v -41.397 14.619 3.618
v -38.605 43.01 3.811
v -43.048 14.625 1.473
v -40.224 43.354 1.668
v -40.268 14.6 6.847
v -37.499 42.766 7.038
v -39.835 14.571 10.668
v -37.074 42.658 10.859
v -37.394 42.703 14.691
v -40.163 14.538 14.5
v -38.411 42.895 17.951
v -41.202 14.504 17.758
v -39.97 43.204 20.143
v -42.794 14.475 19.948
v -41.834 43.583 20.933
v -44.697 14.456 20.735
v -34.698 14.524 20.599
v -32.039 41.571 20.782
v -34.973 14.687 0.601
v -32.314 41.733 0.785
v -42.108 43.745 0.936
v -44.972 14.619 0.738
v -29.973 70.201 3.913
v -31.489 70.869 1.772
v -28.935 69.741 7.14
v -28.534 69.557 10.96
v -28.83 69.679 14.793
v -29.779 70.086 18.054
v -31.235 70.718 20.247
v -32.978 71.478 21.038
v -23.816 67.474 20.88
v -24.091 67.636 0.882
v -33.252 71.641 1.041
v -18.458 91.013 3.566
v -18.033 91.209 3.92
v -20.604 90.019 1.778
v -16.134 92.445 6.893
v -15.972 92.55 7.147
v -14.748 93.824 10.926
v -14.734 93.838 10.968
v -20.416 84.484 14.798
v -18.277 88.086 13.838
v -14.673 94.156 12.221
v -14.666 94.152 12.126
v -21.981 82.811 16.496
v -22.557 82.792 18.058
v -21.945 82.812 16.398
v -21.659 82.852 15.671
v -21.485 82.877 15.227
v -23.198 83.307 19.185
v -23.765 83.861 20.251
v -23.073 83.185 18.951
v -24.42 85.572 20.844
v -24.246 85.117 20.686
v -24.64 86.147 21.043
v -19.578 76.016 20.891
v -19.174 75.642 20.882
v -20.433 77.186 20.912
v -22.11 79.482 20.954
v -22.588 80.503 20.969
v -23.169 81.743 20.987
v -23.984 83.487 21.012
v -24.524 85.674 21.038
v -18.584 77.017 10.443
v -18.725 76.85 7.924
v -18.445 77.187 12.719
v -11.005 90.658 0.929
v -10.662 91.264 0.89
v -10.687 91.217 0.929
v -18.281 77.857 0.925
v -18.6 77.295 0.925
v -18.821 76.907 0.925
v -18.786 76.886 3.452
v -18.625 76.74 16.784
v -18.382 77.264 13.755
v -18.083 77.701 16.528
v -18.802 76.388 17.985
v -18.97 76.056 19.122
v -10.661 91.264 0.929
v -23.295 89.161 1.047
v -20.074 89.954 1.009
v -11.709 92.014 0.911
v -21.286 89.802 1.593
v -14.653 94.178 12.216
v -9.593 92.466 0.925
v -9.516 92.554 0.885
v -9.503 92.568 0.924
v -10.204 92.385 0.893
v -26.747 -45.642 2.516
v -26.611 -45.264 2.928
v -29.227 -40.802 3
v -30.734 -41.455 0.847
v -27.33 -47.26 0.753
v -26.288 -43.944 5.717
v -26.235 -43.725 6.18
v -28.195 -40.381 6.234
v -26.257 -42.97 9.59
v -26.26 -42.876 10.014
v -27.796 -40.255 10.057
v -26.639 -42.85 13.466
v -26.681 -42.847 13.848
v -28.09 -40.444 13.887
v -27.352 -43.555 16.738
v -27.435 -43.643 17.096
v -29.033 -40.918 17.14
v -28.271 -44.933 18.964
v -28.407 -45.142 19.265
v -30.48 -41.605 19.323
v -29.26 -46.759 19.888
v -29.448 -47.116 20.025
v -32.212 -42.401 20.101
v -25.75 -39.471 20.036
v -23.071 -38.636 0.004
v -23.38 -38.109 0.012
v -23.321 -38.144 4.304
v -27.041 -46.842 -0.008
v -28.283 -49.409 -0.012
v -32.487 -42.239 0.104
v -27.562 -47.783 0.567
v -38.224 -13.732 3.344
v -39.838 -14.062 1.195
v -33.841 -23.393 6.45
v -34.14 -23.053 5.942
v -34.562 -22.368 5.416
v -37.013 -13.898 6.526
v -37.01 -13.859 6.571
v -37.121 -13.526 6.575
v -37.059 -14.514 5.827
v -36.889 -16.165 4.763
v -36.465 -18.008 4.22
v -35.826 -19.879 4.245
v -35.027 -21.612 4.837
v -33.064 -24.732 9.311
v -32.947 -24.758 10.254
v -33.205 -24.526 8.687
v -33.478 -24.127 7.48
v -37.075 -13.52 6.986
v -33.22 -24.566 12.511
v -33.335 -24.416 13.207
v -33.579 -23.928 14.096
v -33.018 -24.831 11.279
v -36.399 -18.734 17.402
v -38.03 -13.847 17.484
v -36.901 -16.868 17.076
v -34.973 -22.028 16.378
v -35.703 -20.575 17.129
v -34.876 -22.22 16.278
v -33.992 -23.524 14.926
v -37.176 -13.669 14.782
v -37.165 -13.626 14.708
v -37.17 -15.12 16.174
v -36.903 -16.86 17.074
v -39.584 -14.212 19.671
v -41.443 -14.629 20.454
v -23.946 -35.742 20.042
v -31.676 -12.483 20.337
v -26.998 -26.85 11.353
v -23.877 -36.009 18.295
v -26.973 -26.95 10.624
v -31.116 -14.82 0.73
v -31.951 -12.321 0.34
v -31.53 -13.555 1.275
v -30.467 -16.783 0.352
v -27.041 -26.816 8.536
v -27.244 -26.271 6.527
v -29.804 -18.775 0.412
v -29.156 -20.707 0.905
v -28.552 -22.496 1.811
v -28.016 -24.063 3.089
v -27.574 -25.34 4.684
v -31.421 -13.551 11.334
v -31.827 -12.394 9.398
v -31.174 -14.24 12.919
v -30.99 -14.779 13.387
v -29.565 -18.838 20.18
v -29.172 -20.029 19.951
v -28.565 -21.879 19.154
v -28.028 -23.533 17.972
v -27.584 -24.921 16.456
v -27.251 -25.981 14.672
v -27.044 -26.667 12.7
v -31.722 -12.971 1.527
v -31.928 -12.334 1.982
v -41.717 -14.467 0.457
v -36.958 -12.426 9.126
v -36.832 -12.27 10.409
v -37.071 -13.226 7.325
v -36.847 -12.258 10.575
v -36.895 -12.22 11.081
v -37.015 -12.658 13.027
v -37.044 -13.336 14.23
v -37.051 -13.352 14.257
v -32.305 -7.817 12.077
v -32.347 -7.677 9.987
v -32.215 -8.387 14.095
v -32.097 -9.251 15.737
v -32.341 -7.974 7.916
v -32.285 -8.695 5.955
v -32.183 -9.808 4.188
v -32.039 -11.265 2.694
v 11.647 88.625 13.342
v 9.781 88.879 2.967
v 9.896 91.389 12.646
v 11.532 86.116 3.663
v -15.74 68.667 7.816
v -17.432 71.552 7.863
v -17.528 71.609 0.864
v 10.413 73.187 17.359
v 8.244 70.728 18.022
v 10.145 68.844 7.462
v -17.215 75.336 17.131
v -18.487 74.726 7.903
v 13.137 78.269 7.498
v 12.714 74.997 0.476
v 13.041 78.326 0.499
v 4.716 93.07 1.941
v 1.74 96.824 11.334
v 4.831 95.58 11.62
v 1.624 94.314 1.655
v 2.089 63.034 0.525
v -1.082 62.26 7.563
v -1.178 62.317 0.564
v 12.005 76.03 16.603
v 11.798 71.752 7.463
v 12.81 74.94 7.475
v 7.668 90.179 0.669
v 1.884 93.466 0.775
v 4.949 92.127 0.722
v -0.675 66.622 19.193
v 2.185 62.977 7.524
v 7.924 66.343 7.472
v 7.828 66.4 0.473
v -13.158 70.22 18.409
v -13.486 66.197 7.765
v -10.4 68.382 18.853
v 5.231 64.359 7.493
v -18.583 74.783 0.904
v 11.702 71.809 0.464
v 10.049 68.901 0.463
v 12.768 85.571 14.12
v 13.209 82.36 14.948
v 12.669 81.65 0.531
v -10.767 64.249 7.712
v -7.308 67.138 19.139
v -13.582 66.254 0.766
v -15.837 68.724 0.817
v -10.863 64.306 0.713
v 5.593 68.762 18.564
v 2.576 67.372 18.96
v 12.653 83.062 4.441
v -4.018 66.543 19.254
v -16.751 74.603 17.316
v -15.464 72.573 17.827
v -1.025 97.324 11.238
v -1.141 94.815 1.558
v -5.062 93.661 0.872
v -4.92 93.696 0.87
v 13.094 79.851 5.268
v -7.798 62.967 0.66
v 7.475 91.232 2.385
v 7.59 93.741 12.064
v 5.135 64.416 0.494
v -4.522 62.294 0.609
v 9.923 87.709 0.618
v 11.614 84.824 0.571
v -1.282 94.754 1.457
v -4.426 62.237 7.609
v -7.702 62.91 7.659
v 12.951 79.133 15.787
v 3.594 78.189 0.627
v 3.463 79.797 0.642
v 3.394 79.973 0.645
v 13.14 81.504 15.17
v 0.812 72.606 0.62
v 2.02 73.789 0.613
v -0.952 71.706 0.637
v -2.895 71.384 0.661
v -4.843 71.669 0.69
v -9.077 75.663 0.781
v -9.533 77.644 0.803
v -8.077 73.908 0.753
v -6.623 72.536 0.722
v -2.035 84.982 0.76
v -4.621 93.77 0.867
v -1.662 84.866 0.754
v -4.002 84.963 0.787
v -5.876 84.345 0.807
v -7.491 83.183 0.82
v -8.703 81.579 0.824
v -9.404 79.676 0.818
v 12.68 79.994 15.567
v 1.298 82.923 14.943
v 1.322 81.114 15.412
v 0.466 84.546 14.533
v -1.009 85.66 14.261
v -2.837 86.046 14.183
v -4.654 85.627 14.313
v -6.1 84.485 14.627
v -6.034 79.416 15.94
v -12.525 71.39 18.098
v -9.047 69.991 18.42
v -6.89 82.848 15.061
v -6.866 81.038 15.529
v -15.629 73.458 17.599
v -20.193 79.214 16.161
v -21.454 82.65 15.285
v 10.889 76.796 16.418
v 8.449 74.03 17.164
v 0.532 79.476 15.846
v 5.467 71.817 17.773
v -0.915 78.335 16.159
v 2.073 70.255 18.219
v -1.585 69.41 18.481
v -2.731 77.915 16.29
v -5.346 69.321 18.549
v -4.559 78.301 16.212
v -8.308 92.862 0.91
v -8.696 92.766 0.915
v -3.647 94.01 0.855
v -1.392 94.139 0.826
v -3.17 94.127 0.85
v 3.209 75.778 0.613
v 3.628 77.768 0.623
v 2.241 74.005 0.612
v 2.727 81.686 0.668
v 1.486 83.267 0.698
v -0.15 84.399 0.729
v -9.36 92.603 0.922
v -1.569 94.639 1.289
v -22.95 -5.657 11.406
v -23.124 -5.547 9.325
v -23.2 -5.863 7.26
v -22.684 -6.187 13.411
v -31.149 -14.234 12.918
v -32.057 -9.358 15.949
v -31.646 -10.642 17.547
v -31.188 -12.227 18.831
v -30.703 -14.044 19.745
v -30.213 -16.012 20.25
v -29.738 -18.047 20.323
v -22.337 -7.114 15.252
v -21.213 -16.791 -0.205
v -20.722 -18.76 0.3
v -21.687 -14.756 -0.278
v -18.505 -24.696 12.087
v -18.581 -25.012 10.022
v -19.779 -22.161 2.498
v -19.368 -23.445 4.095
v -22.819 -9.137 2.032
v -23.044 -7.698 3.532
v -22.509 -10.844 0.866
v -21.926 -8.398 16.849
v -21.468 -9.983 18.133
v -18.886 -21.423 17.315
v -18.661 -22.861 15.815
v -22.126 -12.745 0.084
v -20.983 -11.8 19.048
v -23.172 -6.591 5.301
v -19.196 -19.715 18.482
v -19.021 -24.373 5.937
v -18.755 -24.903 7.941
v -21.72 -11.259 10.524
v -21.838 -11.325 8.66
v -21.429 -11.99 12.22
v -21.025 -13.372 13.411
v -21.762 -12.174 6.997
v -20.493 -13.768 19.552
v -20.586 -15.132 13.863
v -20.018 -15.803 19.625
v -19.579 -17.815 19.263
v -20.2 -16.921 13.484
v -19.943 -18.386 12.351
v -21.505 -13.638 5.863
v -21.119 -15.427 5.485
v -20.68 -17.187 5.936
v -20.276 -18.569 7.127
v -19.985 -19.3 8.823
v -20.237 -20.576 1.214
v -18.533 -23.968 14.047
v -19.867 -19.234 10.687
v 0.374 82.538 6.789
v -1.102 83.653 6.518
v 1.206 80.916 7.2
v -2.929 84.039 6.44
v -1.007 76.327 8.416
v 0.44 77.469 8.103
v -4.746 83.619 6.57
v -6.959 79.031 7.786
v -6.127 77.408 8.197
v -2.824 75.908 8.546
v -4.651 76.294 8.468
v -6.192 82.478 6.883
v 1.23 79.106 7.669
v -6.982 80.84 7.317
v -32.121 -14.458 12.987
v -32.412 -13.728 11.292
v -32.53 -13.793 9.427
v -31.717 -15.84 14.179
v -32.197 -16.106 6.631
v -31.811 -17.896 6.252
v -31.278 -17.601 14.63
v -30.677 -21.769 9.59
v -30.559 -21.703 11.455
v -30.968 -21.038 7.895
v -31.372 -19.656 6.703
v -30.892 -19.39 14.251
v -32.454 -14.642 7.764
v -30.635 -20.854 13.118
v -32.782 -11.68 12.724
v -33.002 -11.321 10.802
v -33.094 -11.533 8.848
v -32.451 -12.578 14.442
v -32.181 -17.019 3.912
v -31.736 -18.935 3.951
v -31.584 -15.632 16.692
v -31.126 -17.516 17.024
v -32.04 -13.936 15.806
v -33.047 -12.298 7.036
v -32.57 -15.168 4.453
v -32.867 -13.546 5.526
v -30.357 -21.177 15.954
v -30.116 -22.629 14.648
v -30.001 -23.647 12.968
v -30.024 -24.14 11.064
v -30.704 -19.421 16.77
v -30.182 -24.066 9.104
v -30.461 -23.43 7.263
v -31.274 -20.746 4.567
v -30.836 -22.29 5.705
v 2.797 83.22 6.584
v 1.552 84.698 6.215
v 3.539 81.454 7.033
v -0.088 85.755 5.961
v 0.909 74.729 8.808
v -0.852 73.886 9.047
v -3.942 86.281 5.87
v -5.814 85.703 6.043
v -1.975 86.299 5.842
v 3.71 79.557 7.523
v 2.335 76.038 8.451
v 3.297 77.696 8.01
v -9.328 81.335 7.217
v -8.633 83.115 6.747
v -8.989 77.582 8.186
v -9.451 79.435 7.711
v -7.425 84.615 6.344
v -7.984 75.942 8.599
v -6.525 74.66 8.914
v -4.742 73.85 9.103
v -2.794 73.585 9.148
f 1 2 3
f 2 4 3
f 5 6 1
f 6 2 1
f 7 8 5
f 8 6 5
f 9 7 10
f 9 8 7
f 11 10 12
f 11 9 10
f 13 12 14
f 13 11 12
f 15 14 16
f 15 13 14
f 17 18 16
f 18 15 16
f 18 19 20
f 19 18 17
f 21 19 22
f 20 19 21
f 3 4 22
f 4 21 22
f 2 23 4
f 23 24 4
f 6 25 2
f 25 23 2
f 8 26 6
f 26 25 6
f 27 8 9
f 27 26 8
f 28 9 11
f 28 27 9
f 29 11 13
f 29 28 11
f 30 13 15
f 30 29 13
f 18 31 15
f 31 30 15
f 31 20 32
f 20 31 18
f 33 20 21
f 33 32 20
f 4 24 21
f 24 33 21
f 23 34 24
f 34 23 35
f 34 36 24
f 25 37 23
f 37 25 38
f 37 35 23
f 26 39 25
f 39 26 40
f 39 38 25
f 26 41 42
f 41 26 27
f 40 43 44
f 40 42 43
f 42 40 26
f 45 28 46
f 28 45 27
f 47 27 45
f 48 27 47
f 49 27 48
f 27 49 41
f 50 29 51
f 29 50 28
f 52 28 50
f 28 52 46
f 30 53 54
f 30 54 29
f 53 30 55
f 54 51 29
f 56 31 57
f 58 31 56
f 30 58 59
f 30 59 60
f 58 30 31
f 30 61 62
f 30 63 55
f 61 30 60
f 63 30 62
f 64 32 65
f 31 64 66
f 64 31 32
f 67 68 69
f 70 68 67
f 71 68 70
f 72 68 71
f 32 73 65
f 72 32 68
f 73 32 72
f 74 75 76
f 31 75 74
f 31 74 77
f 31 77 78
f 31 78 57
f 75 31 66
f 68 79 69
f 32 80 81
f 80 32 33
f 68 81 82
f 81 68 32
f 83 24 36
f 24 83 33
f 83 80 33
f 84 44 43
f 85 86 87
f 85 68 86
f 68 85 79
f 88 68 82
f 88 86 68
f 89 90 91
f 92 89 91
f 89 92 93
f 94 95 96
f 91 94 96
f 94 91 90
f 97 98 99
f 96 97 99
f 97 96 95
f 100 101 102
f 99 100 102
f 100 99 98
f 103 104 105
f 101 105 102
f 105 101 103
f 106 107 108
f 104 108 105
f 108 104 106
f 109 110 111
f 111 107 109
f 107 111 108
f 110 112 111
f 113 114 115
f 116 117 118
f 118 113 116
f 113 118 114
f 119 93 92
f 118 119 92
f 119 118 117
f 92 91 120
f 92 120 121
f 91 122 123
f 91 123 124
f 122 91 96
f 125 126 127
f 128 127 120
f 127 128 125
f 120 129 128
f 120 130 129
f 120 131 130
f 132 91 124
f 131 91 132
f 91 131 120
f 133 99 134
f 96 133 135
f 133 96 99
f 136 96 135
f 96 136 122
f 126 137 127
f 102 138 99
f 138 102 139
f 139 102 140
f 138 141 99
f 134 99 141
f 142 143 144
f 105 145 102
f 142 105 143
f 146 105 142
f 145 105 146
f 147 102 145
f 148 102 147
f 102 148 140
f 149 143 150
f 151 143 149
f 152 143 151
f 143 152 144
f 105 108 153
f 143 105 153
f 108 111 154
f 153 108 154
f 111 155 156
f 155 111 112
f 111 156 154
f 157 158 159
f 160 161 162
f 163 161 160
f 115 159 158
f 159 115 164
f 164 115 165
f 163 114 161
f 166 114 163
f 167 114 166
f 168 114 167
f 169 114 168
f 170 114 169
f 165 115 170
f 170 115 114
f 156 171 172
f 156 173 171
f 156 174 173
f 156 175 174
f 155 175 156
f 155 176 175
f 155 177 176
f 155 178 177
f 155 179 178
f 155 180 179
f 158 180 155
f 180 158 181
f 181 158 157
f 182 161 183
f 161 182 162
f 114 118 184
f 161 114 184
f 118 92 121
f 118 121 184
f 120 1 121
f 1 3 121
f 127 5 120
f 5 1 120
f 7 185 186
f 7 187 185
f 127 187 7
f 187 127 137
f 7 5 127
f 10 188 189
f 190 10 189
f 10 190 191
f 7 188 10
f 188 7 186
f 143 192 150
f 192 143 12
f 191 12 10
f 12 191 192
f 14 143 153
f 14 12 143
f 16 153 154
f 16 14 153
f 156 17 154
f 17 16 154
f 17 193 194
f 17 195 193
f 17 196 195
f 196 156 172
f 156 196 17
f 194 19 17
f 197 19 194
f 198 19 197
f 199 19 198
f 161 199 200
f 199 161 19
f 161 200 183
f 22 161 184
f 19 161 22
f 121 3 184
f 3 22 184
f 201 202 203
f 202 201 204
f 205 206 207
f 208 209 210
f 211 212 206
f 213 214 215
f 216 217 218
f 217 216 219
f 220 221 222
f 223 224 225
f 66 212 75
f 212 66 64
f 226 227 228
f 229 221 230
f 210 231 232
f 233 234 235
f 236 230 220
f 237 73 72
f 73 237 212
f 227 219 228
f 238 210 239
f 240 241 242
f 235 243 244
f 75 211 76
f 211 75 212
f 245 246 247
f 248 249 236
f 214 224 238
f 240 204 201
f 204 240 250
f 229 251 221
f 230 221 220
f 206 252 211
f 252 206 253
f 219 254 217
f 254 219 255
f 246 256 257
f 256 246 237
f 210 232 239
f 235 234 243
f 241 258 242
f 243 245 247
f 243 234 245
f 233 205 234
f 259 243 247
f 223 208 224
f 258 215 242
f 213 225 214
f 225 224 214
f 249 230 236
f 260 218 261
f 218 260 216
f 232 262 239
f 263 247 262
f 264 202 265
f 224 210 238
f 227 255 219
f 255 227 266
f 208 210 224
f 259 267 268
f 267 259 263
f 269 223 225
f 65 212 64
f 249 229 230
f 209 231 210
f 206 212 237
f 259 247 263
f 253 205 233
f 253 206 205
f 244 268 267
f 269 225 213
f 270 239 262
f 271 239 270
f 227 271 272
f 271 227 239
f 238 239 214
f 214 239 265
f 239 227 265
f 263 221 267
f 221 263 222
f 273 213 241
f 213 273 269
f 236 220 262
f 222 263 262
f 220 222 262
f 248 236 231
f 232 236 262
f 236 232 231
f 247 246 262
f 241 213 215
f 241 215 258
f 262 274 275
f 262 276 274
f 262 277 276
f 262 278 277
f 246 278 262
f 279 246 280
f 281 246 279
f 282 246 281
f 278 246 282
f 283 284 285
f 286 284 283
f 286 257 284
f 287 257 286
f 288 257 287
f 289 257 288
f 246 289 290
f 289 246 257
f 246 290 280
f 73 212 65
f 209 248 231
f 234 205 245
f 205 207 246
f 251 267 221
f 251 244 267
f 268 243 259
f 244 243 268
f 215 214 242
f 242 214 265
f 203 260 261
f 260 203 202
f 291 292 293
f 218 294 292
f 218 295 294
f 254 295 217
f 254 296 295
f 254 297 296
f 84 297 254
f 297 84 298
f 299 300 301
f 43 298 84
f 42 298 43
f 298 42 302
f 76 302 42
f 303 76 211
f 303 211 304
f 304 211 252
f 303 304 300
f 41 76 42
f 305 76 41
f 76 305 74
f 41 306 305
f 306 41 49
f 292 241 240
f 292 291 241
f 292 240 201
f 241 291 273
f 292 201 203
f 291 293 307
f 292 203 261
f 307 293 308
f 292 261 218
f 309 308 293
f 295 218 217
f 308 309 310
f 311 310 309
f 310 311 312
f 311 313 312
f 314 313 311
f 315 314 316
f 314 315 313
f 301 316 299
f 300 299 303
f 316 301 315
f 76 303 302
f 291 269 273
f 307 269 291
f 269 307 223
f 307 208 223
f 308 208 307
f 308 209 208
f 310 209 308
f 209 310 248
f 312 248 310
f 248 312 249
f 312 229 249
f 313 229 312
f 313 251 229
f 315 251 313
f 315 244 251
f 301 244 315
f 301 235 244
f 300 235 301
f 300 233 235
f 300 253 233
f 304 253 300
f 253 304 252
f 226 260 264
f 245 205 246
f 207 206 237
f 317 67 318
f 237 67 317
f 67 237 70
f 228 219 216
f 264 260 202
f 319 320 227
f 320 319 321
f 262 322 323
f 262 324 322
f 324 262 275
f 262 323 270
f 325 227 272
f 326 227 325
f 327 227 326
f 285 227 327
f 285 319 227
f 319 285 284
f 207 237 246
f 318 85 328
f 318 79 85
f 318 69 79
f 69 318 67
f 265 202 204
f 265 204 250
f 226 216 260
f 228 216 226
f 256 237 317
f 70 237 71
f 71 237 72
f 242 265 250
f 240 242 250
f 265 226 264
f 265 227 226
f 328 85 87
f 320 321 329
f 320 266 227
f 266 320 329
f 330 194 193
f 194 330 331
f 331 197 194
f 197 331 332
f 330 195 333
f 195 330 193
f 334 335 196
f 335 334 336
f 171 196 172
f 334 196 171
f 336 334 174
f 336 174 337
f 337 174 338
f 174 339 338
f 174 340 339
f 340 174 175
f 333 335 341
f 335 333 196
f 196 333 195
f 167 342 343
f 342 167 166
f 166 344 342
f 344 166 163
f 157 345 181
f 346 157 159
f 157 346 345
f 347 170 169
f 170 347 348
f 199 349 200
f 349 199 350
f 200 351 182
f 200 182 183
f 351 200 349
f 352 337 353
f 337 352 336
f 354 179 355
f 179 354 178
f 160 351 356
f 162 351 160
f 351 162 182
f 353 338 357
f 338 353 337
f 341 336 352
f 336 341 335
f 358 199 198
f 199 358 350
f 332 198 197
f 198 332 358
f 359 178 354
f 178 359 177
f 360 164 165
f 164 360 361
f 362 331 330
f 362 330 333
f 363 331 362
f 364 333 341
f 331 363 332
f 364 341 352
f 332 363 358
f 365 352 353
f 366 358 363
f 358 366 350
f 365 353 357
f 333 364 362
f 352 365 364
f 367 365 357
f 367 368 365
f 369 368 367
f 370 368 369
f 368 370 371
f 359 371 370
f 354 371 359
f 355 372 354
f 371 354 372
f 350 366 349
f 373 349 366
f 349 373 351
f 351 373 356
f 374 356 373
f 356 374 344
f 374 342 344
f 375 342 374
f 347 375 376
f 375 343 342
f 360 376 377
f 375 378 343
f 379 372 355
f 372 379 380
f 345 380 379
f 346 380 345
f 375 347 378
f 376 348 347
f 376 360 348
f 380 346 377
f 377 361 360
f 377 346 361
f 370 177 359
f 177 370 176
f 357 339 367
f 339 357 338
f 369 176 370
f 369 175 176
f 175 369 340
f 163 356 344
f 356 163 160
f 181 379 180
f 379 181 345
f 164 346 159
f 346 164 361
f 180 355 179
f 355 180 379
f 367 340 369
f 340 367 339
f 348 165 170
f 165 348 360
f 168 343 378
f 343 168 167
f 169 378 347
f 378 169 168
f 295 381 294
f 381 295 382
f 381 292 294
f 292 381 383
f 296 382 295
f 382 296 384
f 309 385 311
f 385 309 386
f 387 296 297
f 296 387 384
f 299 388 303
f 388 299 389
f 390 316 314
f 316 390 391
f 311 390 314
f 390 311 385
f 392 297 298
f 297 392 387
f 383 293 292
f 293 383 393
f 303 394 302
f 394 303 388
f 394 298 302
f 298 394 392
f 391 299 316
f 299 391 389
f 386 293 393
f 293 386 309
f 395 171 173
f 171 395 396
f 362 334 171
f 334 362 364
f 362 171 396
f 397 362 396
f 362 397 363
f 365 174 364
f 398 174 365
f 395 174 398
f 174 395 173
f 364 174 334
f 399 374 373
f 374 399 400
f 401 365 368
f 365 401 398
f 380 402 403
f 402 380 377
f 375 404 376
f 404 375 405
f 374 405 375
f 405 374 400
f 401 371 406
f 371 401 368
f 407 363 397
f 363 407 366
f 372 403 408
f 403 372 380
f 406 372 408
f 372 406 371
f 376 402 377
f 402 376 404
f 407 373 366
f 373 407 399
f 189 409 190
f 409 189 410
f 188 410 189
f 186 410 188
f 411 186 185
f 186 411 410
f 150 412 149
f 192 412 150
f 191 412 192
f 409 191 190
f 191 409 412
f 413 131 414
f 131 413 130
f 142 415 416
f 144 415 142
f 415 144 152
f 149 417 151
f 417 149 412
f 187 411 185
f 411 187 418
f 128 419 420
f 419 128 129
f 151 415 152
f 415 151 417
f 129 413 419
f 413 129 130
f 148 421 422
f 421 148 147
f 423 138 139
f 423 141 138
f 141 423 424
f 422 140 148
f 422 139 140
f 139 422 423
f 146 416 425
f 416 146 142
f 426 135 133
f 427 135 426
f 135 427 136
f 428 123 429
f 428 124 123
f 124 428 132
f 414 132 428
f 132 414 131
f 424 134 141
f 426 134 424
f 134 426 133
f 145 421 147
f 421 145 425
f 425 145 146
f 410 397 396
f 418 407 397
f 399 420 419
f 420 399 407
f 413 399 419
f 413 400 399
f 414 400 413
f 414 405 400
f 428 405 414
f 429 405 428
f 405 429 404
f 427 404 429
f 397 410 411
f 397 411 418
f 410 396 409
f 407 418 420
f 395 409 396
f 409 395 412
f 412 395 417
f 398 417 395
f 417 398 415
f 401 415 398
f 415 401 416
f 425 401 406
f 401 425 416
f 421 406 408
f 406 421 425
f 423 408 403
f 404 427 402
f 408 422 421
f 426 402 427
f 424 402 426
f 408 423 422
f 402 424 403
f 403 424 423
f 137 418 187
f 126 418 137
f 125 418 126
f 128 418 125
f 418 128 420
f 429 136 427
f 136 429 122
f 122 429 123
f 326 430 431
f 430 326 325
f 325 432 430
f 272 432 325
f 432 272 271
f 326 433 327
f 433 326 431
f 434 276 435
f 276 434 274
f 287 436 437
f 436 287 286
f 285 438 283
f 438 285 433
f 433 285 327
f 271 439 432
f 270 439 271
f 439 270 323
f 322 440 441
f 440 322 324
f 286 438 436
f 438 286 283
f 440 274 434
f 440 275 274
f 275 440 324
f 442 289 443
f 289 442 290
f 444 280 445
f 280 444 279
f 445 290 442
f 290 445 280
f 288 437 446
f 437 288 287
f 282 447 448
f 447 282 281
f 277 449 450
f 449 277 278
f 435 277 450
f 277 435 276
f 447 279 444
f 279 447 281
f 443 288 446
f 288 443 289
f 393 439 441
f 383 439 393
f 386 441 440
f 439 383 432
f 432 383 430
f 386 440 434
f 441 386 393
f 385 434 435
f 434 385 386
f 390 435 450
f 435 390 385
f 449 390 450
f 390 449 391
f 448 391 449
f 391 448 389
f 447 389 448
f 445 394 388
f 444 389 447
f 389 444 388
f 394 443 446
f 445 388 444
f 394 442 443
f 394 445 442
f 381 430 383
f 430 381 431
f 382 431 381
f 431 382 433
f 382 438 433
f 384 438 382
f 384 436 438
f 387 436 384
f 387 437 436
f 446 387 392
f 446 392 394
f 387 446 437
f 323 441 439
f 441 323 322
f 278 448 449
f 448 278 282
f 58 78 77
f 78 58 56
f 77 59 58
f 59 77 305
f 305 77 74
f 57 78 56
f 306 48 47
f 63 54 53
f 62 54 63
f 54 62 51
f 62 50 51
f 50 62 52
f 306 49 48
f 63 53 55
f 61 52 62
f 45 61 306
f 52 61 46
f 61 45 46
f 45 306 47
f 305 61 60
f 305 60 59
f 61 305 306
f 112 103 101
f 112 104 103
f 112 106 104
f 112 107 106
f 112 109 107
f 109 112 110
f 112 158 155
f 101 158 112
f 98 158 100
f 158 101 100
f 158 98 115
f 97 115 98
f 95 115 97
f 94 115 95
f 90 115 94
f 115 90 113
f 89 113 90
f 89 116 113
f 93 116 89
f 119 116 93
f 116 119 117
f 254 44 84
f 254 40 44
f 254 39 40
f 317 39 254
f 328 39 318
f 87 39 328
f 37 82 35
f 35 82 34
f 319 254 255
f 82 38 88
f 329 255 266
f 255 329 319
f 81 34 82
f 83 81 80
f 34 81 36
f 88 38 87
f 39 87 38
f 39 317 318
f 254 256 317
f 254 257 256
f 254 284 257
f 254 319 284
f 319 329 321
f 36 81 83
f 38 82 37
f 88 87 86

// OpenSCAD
module lower_outer(){
difference(){
union(){
rotate([15,0,-13]) translate([95,15,19]) rotate_extrude(convexity = 10) 2d_disk();
hull(){
translate([14,72,34]) cylinder(r=16,h=10);
translate([14,72,29]) rotate([15,0,-13]) cylinder(r=16,h=7);
}
translate([-35,-14,14]) rotate([90,0,90]) cylinder(r=10,h=10);
}
translate([14,72,24]) rotate([0,0,0] ) cylinder(r=4.2,h=20);
translate([-45,-14,14]) rotate([90,0,90] ) cylinder(r=4.2,h=30);
translate([-46,-14,14]) rotate([90,0,90] ) cylinder(r=6.6,h=10);
translate([14,72,26]) rotate([0,0,0] ) cylinder(r=6.6,h=10);
translate([14,77,44]) cylinder(r1=18,r2=25,h=15);
rotate([0,0,-40]) translate([-3,-200,-30]) cube([250,400,100]);
translate([-25,-14,14]) rotate([90,0,90]) cylinder(r=18,h=15);
translate([-30,87,0]) cube([150,100,100]);
}
}

translate([0,0,-9]) rotate([-14,4,13]) lower_outer();

module 2d_disk(){
//translate([105,-4]) square([30,8]);
difference(){
translate([130,-10]) square([10,20]);
translate([140,0]) scale([1,2]) circle(r=5);
}
}

//translate([0,0,24]) rotate([0,90,0]) footpeg_mount();

module footpeg_mount(){
difference(){
union(){
translate([0,-28,0]) cut_cube(24,54,28,4);
translate([9,4,26]) cut_cube(15,32,32,3);
translate([4,15,56]) cut_cube(20,50,20,4);
translate([0,48,74]) cut_cube(24,35,10,4);
translate([0,-14,14]) rotate([90,0,90]) cylinder(h=14,r=10);
}
translate([20,-14,14]) rotate([90,0,90]) nut_cap(13.6,10);
translate([14,72,73])rotate([0,0,90]) cylinder(h=14,r=4.2);
translate([-1,-14,14]) rotate([90,0,90]) cylinder(h=26,r=4.2);
}
}//end part




module cut_cube(x,y,z,d){
m = 2.5;
difference(){
cube([x,y,z]);
translate([0,m,m]) cube([d,y-2*m,z-2*m]);
translate([0,2*m,2*m]) cube([2*d,y-4*m,z-4*m]);
translate([0,3*m,3*m]) cube([3*d,y-6*m,z-6*m]);
}
}

module nut_cap(nut_size,depth){
union(){
for(a = [0,60,120]){
rotate([0,0,a]) cube([nut_size,.5774*nut_size,depth],center = true);
}//end for
}//end union
}
